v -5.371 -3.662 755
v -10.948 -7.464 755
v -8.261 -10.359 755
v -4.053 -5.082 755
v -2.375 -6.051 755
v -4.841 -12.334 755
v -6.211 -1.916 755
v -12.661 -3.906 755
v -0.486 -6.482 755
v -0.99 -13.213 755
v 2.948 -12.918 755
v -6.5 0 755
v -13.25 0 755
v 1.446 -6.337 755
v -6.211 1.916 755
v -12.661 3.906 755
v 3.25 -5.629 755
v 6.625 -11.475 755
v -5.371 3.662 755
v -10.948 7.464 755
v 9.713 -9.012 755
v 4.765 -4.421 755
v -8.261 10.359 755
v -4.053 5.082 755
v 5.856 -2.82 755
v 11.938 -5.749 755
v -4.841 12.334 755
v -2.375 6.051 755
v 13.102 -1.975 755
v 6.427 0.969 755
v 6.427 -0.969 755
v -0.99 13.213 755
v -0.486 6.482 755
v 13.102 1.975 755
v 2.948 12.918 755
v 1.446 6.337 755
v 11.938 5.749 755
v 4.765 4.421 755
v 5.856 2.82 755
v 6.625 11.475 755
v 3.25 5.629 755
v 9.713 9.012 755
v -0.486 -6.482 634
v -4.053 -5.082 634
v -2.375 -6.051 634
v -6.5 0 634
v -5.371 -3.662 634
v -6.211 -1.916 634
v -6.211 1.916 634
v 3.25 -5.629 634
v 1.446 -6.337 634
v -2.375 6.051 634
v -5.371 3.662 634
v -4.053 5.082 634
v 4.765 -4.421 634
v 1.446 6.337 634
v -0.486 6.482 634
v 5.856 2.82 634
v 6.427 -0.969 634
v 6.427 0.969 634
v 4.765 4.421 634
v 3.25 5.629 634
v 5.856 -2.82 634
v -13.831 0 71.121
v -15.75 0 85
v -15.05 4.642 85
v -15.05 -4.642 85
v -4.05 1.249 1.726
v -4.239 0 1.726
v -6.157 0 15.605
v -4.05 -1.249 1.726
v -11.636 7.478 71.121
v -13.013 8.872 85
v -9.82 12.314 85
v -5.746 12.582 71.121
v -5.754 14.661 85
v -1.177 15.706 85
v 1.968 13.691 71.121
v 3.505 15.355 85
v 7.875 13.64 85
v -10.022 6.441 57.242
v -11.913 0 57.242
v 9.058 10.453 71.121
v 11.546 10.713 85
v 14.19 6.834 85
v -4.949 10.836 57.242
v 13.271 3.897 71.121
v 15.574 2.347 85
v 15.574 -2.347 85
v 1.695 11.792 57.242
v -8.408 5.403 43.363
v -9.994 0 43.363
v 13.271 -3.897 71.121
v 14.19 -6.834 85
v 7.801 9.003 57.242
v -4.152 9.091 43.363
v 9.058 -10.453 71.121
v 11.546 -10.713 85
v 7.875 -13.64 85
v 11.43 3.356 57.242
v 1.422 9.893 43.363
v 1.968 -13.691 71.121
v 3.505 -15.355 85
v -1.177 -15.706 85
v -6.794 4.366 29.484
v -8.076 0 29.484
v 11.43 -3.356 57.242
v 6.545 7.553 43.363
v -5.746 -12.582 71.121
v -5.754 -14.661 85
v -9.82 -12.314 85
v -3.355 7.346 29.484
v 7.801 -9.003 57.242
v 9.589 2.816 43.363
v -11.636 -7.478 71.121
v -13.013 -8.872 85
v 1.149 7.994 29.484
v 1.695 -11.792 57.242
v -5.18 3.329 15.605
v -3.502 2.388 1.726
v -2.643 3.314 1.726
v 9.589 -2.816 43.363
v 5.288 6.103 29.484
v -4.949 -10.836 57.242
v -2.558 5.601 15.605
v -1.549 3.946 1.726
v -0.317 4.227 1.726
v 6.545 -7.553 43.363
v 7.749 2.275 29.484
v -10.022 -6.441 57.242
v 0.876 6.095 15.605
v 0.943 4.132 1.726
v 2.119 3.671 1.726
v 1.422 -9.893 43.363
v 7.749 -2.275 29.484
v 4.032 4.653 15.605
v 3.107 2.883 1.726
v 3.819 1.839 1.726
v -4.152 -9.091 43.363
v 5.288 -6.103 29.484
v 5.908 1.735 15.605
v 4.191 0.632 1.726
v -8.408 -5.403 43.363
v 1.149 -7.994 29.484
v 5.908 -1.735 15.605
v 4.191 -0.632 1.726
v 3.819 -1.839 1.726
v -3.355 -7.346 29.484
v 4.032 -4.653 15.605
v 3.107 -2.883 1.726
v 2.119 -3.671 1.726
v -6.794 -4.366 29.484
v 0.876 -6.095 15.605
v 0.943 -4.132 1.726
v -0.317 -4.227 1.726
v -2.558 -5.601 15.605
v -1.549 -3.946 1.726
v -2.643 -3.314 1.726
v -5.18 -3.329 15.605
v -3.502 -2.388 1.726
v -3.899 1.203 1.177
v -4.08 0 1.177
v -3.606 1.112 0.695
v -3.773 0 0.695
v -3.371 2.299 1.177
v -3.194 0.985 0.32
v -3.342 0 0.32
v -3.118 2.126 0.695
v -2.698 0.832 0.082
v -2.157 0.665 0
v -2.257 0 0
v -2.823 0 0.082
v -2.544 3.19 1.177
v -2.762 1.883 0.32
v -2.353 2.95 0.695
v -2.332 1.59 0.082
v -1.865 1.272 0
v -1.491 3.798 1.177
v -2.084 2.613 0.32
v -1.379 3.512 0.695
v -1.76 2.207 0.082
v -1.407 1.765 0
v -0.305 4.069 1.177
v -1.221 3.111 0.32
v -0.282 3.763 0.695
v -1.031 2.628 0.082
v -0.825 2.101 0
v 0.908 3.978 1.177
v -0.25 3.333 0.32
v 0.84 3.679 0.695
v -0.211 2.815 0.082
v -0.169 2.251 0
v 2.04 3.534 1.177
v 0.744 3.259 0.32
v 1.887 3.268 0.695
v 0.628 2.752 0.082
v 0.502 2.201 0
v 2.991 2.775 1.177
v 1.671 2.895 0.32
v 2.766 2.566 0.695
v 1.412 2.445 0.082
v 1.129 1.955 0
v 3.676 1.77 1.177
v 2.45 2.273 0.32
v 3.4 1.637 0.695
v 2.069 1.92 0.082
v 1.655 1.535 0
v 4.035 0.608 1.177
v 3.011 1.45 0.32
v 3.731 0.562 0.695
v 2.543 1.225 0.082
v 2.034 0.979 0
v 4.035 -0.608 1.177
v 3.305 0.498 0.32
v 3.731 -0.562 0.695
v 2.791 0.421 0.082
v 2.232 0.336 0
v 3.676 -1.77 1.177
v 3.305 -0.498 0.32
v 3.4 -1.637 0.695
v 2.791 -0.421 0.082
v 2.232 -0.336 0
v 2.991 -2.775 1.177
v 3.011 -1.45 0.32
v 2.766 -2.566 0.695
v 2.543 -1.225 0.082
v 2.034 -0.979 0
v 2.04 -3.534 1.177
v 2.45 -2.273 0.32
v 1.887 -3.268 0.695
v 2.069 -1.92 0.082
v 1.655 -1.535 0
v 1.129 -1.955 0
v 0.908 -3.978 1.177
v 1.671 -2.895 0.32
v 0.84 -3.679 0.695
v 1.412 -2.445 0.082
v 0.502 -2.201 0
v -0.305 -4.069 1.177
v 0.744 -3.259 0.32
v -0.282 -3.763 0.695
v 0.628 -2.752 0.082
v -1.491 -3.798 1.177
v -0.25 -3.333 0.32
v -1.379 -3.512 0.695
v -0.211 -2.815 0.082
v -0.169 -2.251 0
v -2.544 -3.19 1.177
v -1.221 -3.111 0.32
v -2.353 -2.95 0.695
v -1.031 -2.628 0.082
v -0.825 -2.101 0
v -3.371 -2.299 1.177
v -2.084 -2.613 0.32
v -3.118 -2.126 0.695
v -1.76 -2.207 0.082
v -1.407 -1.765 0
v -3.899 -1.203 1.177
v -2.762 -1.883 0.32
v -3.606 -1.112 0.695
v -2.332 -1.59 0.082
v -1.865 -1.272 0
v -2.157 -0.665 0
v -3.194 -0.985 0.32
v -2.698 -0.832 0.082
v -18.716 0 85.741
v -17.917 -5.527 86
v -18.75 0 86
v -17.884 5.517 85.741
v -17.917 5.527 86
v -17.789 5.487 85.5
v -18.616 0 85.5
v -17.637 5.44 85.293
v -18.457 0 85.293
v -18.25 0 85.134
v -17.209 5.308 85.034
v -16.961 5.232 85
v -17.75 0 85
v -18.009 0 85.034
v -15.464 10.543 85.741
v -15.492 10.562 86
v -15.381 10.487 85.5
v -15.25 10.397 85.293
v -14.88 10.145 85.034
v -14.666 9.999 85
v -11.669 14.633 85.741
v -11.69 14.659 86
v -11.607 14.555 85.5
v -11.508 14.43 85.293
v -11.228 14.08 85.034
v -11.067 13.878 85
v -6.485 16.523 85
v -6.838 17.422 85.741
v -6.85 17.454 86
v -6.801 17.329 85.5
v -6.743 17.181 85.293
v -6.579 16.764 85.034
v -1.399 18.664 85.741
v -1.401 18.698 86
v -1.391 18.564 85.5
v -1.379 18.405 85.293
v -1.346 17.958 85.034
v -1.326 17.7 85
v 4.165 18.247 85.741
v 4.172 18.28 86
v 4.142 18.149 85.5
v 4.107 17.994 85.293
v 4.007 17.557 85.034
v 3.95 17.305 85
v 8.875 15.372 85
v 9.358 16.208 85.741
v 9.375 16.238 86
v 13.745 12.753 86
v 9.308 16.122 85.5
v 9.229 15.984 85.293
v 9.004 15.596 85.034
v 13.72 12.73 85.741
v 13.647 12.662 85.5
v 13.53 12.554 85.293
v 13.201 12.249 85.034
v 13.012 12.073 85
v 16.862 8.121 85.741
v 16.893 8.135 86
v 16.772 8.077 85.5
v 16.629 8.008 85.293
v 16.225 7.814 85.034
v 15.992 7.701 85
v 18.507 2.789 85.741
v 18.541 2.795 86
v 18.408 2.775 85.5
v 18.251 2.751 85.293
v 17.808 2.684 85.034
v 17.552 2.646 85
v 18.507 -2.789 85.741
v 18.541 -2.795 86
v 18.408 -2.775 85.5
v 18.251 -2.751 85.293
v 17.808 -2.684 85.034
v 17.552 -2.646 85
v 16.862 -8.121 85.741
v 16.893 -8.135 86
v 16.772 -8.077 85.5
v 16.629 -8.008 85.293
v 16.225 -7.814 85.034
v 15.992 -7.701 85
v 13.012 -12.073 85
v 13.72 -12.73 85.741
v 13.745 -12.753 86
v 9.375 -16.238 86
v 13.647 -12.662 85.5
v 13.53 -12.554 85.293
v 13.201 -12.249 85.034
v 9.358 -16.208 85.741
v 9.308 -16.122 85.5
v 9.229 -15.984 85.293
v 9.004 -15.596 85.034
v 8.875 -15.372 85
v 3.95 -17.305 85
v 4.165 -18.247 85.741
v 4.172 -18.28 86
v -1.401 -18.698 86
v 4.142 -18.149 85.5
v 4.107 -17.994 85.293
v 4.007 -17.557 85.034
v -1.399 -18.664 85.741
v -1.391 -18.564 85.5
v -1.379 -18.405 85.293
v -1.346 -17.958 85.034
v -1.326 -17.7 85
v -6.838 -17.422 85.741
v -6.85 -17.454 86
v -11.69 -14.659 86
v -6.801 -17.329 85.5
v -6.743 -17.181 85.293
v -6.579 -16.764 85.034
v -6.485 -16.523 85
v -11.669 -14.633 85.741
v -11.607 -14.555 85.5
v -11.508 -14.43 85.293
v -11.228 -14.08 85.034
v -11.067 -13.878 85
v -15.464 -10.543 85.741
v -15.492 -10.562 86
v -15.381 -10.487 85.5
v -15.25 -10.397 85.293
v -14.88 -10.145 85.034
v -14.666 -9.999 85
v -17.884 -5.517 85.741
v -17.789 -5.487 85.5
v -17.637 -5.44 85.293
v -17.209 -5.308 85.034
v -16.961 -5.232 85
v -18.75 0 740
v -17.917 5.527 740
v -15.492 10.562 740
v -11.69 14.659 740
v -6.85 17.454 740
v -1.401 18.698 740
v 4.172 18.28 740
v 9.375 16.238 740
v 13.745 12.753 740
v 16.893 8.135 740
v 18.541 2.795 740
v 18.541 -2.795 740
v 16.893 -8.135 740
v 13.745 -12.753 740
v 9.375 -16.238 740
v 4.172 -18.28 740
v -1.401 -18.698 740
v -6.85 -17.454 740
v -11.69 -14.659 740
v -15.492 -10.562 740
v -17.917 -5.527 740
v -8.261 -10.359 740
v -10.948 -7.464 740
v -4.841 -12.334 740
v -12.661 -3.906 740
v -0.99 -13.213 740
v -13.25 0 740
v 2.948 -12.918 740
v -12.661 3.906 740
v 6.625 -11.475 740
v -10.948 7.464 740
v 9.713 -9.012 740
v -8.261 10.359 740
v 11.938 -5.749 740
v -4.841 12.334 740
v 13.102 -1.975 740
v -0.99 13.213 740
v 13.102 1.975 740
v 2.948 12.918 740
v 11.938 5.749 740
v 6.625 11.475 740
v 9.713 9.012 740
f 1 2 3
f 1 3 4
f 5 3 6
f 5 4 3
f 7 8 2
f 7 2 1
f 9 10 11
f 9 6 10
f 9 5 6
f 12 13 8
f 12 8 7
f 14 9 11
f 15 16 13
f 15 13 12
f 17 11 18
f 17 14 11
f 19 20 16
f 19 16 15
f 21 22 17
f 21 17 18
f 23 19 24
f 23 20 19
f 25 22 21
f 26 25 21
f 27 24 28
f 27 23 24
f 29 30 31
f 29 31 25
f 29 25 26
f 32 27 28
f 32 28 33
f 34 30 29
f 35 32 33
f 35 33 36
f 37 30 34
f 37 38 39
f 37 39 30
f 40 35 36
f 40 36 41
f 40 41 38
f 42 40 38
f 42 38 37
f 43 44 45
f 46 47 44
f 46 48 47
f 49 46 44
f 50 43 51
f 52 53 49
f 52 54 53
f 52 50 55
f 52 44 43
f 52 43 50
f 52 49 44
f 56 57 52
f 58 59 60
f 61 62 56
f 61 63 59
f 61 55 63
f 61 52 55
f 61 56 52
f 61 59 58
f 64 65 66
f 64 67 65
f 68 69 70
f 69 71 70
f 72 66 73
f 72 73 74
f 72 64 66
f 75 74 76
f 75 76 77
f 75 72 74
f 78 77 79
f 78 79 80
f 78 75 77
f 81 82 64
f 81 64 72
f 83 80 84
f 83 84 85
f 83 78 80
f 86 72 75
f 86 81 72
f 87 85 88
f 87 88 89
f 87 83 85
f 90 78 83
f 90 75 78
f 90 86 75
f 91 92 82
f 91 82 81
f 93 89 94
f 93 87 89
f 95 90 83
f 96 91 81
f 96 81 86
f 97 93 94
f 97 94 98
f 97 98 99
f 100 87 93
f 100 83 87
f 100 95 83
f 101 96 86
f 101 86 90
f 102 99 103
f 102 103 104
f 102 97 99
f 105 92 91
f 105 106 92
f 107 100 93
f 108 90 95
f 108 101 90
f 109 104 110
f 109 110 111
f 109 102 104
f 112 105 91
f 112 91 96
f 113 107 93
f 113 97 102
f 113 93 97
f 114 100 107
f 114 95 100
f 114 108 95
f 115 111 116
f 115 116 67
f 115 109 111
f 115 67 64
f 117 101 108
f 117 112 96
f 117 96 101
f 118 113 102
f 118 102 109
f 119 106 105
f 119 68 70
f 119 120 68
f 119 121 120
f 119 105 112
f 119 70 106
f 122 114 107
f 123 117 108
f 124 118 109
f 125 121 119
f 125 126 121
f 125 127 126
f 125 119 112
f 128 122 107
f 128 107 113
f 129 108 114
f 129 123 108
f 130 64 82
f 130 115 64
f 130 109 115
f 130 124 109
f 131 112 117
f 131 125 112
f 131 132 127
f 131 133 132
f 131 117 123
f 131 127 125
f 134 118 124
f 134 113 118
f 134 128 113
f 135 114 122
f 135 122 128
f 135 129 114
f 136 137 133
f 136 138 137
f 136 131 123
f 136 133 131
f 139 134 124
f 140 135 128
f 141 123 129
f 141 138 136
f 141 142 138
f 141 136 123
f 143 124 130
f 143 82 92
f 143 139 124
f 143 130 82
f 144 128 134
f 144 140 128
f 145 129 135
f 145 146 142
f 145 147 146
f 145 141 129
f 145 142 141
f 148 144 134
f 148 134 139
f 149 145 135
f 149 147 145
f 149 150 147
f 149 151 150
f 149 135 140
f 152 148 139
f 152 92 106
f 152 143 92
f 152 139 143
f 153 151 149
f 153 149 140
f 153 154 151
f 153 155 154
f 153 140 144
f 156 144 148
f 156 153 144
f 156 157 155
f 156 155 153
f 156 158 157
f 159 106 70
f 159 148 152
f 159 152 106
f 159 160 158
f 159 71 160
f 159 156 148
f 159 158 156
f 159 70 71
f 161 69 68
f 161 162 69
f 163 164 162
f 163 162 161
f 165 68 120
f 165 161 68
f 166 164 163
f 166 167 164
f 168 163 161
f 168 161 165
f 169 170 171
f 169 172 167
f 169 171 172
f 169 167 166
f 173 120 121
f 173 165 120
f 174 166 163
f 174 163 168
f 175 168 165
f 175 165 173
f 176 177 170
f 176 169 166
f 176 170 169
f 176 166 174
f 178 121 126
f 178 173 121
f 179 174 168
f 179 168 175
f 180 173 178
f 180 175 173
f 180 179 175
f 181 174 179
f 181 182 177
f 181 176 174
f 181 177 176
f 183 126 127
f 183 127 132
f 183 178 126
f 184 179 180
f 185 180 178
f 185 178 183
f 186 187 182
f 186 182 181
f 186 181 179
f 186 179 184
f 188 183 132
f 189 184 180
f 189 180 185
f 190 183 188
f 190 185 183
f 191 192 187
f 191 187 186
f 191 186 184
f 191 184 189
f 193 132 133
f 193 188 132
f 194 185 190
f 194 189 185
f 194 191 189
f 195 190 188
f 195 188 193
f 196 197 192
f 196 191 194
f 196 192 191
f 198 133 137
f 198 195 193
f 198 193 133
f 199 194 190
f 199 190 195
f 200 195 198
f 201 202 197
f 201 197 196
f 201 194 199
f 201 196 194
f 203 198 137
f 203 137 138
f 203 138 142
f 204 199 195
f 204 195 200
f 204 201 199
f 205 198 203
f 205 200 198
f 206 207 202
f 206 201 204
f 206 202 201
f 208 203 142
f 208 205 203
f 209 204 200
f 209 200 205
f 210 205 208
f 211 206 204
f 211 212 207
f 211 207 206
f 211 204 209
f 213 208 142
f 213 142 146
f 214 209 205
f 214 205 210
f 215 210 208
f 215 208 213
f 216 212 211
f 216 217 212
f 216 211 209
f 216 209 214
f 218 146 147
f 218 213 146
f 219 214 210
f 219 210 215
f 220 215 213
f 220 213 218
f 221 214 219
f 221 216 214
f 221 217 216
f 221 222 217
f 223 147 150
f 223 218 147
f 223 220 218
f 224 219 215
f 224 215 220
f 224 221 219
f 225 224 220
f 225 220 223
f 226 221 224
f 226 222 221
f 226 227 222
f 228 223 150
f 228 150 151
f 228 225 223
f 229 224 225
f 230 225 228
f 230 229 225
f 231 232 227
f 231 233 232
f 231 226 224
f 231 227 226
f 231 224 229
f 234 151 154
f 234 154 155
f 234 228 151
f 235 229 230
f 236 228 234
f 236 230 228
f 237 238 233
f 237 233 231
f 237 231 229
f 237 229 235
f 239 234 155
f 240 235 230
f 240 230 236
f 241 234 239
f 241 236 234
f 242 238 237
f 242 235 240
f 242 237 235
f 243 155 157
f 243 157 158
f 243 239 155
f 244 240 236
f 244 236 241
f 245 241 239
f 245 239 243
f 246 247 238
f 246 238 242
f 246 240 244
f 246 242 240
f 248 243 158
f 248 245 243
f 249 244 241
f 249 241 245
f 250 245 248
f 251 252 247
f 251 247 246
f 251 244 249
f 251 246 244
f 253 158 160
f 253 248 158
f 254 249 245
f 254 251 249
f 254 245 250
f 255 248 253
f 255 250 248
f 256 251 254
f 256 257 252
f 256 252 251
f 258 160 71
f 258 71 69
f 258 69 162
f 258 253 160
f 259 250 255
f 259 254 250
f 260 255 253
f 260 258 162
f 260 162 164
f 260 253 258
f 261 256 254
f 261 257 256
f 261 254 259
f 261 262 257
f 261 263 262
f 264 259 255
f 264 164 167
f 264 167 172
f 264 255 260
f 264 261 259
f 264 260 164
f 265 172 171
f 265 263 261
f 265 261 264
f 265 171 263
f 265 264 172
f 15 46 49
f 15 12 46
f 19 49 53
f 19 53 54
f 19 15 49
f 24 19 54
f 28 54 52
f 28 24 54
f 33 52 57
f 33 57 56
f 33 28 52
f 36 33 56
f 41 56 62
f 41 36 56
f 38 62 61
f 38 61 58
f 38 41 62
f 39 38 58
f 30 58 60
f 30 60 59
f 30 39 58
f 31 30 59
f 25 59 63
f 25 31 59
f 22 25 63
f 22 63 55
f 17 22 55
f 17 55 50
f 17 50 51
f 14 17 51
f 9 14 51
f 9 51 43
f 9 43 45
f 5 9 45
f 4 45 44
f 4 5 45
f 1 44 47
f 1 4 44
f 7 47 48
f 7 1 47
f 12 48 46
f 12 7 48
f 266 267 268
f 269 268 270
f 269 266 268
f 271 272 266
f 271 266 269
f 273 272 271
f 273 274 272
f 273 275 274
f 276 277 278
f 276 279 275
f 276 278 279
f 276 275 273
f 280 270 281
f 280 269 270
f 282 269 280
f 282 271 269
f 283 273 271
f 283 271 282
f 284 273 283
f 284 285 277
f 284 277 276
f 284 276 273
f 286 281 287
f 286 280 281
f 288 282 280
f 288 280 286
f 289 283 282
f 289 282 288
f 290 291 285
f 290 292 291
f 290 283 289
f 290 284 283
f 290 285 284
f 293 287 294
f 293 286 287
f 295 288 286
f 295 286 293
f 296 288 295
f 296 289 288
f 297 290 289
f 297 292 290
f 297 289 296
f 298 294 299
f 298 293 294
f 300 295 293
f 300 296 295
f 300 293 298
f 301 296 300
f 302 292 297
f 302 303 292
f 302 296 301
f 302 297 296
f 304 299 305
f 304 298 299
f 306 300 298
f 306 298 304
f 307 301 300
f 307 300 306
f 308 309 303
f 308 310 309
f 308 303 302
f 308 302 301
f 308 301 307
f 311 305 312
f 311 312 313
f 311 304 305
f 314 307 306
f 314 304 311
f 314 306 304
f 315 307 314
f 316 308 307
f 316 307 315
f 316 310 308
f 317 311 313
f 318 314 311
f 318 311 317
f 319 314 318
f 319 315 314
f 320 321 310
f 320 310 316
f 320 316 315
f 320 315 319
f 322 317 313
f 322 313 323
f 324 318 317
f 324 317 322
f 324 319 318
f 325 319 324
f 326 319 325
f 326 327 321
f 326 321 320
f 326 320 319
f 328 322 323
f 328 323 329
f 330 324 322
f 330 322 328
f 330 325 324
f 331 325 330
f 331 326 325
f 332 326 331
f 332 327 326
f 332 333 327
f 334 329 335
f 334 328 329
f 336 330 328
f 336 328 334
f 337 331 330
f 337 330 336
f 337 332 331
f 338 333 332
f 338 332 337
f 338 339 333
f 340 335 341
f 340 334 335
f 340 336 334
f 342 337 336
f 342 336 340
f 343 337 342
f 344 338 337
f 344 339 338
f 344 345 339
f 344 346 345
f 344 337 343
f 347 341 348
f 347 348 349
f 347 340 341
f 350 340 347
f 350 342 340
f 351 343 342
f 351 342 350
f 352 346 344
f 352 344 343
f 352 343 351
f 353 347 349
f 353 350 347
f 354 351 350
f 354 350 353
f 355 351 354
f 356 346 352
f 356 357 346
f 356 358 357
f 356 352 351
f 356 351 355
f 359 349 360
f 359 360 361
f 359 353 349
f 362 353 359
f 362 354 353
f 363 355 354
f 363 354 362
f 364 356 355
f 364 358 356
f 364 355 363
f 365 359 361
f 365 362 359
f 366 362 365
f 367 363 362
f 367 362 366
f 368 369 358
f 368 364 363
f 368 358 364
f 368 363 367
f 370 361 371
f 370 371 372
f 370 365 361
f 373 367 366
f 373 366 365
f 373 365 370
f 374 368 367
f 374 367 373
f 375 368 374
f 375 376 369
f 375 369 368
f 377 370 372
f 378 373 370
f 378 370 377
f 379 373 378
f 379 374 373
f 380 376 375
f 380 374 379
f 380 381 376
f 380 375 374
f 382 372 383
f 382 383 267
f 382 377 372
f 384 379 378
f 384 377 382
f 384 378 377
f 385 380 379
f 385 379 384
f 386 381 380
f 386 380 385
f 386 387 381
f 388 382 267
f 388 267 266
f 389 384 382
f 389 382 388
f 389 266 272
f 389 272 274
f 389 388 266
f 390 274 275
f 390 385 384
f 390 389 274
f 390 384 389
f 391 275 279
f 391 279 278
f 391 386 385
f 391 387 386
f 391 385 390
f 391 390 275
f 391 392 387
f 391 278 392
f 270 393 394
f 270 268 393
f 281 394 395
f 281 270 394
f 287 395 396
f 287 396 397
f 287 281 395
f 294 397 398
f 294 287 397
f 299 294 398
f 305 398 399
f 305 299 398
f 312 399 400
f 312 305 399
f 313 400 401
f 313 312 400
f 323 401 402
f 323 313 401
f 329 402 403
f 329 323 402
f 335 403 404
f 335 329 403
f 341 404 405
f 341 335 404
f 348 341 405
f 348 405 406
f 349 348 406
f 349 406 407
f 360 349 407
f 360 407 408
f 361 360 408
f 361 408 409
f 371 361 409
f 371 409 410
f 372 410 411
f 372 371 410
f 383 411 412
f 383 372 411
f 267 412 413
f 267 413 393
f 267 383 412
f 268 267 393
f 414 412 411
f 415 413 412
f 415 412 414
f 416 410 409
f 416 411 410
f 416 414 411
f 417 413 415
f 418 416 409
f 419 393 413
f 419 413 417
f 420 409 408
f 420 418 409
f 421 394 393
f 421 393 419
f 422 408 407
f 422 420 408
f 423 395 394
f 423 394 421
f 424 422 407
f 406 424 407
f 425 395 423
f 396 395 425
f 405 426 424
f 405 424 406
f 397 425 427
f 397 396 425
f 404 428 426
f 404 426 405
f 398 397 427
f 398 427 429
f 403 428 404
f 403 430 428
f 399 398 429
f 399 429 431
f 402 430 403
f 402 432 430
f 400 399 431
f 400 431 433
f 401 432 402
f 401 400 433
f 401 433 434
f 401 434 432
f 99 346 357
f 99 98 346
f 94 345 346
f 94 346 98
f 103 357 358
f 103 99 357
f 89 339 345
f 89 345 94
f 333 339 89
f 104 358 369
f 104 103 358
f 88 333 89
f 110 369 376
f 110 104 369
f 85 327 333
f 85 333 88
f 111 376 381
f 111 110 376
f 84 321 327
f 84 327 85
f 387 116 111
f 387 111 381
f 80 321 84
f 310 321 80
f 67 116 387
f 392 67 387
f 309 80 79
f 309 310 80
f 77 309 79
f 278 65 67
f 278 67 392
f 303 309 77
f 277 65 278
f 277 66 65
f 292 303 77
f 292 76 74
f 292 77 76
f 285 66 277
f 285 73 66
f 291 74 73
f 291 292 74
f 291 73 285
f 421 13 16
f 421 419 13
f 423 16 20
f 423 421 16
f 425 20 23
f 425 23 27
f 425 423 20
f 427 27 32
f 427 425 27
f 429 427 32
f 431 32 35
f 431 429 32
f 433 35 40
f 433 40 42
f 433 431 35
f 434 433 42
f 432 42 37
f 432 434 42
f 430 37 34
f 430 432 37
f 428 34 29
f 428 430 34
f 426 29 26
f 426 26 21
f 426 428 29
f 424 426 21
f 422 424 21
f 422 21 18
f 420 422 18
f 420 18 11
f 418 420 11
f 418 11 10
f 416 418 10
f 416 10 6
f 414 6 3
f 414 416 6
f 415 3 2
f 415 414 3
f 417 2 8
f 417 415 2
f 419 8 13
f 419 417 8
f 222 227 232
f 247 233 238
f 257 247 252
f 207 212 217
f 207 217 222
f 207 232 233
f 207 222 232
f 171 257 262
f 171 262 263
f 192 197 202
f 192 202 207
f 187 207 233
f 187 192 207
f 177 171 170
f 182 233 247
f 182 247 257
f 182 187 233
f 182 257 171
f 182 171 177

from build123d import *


with BuildPart() as f1:
    # F0 (on Front) → F1 (revolve)
    with BuildSketch(Plane.XZ):
        with BuildLine():
            Line((-13.25, 755), (-13.25, 740))
            Line((-13.25, 740), (-18.75, 740))
            Line((-18.75, 740), (-18.75, 86))
            ThreePointArc((-18.75, 86), (-18.457107, 85.292893), (-17.75, 85))
            Line((-17.75, 85), (-15.75, 85))
            Line((-15.75, 85), (-4.238613, 1.726134))
            ThreePointArc((-4.238613, 1.726134), (-3.571276, 0.492066), (-2.257452, 0))
            Line((-2.257452, 0), (0, 0))
            Line((0, 0), (0, 634))
            Line((0, 634), (-6.5, 634))
            Line((-6.5, 634), (-6.5, 755))
            Line((-6.5, 755), (-13.25, 755))
        make_face()
    revolve(axis=Axis((0, 0, 317), (0, 0, -1)))


solid = f1.part
